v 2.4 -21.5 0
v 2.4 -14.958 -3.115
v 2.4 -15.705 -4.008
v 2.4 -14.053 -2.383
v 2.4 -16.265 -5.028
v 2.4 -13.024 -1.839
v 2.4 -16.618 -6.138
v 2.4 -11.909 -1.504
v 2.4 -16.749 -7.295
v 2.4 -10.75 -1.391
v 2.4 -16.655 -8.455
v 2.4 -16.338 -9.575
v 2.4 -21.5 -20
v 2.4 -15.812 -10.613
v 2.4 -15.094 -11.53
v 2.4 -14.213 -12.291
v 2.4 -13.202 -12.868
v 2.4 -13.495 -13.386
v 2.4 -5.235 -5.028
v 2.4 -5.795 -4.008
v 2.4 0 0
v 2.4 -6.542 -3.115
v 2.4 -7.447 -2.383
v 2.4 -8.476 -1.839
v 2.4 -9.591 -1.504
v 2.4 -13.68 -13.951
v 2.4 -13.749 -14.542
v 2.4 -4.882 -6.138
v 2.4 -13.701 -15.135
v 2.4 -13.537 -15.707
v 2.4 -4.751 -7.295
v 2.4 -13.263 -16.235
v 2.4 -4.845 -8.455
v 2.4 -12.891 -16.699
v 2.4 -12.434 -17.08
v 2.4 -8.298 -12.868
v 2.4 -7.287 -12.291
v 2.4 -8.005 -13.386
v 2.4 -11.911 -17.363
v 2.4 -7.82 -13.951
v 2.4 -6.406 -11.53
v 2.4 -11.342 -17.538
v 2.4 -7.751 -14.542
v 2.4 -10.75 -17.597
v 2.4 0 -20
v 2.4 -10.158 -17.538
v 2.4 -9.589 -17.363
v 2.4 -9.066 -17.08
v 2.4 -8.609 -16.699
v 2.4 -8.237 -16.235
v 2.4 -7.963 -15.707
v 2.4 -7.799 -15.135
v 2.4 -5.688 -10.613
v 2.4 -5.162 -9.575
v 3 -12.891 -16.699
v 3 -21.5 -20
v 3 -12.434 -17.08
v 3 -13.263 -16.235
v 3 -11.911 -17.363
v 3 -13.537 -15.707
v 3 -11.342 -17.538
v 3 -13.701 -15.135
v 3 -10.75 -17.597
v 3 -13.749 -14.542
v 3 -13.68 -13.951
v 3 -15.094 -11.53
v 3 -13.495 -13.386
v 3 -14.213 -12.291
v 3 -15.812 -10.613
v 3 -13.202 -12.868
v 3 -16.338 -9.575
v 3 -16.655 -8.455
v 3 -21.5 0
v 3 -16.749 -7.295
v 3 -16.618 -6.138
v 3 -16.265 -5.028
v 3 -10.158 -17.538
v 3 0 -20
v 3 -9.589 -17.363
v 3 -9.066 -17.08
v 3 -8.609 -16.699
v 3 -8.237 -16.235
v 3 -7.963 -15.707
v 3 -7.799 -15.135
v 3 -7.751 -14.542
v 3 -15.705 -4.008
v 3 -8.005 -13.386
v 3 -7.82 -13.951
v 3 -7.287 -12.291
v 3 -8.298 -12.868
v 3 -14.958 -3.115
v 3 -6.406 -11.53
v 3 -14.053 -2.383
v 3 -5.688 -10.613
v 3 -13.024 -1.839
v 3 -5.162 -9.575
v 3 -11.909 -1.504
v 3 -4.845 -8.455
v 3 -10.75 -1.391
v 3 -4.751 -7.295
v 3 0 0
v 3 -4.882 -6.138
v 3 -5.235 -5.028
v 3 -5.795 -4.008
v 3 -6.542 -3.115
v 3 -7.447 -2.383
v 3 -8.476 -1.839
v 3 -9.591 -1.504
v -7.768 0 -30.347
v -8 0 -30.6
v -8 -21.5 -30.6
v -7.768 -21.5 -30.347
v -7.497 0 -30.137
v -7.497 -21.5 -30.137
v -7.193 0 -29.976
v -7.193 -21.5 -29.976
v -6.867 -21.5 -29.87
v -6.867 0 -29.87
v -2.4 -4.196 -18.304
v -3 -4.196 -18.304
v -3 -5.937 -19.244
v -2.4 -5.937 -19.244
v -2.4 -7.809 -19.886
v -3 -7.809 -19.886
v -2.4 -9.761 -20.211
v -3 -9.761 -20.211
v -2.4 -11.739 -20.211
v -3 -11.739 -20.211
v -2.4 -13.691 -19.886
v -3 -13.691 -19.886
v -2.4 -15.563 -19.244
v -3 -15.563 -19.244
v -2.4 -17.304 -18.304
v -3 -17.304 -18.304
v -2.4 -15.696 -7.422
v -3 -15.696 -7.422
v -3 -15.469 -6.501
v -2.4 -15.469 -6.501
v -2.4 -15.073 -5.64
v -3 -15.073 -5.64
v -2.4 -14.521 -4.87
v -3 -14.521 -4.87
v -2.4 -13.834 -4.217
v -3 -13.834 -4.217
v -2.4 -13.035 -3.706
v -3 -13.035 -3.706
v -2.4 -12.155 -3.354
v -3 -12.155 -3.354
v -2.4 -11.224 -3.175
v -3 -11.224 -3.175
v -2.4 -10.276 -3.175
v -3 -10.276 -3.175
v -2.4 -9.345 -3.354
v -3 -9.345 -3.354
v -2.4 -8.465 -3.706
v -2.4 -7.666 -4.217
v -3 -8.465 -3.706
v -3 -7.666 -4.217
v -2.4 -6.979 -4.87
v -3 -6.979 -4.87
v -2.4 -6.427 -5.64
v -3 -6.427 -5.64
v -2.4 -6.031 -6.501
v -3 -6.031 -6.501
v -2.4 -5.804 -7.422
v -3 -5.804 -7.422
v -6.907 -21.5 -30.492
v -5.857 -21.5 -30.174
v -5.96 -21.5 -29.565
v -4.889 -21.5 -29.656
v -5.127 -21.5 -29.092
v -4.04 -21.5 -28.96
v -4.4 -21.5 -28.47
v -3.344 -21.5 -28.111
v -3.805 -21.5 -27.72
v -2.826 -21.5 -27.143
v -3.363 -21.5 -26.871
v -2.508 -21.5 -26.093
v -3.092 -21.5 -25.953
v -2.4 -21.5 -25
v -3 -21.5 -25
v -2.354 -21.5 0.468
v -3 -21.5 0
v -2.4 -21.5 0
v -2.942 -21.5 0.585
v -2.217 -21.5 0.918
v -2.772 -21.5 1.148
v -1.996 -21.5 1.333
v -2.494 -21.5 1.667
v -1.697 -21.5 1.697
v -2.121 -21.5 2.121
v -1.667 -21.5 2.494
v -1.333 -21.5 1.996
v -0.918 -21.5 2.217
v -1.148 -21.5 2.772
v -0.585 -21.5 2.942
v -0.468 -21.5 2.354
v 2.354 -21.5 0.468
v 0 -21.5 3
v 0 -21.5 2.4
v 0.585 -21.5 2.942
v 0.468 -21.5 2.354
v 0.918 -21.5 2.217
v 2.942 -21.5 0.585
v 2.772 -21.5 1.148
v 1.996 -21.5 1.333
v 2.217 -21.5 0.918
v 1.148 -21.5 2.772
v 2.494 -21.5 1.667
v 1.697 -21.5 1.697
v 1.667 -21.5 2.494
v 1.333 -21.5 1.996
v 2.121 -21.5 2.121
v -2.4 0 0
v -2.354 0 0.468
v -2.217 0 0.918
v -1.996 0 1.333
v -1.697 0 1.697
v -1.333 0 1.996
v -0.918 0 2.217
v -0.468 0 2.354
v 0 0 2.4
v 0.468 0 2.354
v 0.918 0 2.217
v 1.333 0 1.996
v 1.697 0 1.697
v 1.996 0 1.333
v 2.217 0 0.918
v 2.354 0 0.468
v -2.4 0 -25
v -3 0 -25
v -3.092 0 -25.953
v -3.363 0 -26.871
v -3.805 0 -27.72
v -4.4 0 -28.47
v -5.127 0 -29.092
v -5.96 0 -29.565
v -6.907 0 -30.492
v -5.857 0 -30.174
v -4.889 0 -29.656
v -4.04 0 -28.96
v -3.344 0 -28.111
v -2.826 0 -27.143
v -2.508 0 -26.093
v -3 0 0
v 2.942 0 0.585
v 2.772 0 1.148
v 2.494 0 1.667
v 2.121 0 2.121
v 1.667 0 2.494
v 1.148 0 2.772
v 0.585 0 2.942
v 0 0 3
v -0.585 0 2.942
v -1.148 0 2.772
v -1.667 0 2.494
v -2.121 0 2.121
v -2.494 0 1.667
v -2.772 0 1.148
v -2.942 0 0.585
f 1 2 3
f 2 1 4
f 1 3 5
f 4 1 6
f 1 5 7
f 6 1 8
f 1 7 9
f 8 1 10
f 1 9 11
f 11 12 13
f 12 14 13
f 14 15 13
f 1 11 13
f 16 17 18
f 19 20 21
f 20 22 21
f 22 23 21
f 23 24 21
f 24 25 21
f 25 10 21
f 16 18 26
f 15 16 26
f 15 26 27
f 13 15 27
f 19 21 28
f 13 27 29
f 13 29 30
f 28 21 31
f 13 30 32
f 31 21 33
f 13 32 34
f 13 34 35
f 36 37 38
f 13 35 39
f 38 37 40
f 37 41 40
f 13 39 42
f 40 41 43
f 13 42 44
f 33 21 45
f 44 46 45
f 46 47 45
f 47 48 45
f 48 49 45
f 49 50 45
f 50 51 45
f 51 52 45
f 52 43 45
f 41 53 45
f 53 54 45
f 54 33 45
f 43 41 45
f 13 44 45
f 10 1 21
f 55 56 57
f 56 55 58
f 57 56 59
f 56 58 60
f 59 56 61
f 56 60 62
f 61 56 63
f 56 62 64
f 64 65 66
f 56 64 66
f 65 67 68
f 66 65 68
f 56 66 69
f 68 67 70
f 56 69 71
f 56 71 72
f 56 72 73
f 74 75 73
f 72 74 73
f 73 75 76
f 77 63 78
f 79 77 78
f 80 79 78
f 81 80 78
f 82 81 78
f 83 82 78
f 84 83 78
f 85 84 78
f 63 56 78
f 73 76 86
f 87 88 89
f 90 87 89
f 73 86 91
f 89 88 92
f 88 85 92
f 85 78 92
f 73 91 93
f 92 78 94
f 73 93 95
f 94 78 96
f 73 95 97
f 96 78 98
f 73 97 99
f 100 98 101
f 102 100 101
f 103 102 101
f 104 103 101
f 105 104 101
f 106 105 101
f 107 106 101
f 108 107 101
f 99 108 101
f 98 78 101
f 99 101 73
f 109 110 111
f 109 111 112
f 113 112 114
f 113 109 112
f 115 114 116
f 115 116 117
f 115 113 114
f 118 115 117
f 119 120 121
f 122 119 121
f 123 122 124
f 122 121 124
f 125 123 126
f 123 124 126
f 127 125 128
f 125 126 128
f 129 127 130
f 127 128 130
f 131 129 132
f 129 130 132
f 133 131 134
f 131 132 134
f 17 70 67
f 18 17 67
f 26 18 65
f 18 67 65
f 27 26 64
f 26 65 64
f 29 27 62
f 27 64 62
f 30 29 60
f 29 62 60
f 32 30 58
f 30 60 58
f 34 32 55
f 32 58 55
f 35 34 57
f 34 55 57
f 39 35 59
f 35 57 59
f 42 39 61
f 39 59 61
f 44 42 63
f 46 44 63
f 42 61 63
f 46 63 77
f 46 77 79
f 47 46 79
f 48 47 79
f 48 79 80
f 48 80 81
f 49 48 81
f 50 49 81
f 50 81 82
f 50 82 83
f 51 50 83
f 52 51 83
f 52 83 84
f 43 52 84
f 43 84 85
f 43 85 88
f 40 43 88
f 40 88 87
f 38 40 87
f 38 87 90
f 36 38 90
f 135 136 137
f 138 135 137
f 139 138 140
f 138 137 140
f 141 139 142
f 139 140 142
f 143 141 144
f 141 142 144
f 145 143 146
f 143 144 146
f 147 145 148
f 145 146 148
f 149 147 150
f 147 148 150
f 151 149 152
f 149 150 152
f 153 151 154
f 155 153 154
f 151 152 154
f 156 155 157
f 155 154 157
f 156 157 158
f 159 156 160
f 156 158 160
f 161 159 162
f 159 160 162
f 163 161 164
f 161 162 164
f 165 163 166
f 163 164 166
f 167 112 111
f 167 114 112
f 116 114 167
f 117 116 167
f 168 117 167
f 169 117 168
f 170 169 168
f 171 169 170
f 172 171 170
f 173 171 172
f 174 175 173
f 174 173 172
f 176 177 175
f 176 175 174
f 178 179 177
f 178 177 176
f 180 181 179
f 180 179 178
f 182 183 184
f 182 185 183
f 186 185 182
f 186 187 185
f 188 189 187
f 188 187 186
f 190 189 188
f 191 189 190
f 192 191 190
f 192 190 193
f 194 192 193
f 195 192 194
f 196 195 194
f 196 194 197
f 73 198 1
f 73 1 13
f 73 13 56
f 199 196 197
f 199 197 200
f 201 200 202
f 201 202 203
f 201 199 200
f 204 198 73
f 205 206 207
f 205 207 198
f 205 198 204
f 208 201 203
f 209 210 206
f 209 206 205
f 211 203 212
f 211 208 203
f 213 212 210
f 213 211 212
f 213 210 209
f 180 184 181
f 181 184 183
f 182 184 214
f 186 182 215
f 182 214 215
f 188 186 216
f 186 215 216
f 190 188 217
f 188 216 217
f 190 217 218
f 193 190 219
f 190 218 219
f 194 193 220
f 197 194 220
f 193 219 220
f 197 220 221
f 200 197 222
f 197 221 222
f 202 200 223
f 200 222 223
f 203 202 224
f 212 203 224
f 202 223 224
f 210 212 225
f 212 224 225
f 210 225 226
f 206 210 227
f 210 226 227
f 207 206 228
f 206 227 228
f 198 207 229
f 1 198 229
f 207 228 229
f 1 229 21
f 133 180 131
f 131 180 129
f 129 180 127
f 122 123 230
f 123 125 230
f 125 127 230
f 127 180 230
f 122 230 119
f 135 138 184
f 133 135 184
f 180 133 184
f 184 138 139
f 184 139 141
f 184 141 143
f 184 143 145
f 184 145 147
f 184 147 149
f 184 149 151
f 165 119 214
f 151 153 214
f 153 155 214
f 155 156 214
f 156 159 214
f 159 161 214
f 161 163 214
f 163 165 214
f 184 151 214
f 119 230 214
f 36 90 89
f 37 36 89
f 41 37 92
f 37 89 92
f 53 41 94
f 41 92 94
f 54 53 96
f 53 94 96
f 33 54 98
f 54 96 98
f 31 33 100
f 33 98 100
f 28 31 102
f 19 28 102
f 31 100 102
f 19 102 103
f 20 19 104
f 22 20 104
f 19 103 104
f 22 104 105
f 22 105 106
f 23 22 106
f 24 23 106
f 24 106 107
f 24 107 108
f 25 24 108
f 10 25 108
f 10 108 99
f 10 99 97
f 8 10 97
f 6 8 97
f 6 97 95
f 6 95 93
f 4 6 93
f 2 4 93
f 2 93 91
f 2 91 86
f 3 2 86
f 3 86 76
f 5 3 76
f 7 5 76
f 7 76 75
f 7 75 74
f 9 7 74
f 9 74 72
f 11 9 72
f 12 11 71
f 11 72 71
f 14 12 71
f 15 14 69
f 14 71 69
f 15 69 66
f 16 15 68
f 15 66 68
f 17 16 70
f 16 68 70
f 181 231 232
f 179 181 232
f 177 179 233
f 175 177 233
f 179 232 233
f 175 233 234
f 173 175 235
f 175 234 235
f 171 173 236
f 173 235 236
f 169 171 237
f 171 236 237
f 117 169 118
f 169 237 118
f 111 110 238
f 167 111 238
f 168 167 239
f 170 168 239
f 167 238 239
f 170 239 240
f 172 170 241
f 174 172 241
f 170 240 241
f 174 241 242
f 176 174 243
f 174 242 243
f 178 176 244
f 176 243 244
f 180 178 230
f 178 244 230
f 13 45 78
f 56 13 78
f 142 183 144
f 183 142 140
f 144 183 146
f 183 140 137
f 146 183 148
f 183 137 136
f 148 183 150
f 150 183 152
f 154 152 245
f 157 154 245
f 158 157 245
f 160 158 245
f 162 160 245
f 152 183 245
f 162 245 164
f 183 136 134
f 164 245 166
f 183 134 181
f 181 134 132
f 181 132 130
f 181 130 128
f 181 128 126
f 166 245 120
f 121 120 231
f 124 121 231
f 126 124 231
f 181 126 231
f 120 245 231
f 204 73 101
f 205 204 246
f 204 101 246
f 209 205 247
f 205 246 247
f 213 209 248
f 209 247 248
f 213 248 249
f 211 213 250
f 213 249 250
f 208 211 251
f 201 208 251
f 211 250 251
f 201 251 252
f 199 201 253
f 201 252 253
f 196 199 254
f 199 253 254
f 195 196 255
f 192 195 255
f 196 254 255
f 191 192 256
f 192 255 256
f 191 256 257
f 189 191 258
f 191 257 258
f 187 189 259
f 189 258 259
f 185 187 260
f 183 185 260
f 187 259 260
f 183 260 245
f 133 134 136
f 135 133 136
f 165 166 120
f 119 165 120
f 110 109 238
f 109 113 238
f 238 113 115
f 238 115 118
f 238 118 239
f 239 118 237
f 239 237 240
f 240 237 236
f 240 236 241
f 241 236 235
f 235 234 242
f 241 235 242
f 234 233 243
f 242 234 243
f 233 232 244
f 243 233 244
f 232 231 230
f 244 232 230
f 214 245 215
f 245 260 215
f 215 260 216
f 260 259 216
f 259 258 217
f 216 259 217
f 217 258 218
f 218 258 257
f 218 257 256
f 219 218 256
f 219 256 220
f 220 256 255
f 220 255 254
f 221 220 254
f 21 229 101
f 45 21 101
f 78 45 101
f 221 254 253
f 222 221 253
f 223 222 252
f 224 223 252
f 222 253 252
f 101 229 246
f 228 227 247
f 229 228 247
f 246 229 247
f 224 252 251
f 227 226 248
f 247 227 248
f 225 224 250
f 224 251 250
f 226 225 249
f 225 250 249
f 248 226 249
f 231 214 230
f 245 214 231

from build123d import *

# Parameters (mm, degrees)
F1_DEPTH    = 21.5
F3_DEPTH    = 1
F5_DEPTH    = 1
F6_T1_DEPTH = 27.2031140795


# Not quite as in the source:
# - a fillet or chamfer that OpenCascade refuses, or shapes differently, is made with other operations: its cross-section is extruded or revolved along the edge and cut away or added


with BuildPart() as f1:
    # F0 (on Front) → F1 (new body)
    with BuildSketch(Plane.XZ):
        with BuildLine():
            Line((-3, 0), (-3, -25))
            ThreePointArc((-3, -25), (-4.4644660941, -28.5355339059), (-8, -30))
            Line((-8, -30), (-8, -30.6))
            ThreePointArc((-8, -30.6), (-4.0402020254, -28.9597979746), (-2.4, -25))
            Line((-2.4, -25), (-2.4, 0))
            ThreePointArc((-2.4, 0), (0, 2.4), (2.4, 0))
            Line((2.4, 0), (2.4, -20))
            Line((2.4, -20), (3, -20))
            Line((3, -20), (3, 0))
            ThreePointArc((3, 0), (0, 3), (-3, 0))
        make_face()
    extrude(amount=F1_DEPTH)

    # F2 (on face) → F3 (cut)
    with BuildSketch(Plane(origin=(-3, 0, 0), x_dir=(0, -1, 0), z_dir=(-1, 0, 0))):
        with BuildLine():
            Line((5.8037092493, -7.4218333804), (4.195739785, -18.3036730319))
            ThreePointArc((4.195739785, -18.3036730319), (10.75, -20.2517243137), (17.304260215, -18.3036730319))
            Line((17.304260215, -18.3036730319), (15.6962907507, -7.4218333804))
            ThreePointArc((15.6962907507, -7.4218333804), (10.75, -3.1527285914), (5.8037092493, -7.4218333804))
        make_face()
    extrude(amount=-F3_DEPTH, mode=Mode.SUBTRACT)

    # F4 (on face) → F5 (cut)
    with BuildSketch(Plane.YZ.offset(3)):
        with BuildLine():
            ThreePointArc((-13.2016747035, -12.8677467976), (-10.75, -17.5967034623), (-8.2983252965, -12.8677467976))
            ThreePointArc((-8.2983252965, -12.8677467976), (-10.75, -1.3914988898), (-13.2016747035, -12.8677467976))
        make_face()
    extrude(amount=-F5_DEPTH, mode=Mode.SUBTRACT)

    # F6: fillet of radius 2 on 1 edges, made by hand

    # F6_s2 → F6_t1 (cut)
    with BuildSketch(Plane.XZ.offset(-2.8515570398)):
        with BuildLine():
            ThreePointArc((-8, -30.6), (-7.4967757486, -30.136601148), (-6.8668213437, -29.8698979592))
            ThreePointArc((-6.8668213437, -29.8698979592), (-7.429688592, -29.9673680051), (-8, -30))
            Line((-8, -30), (-8, -30.6))
        make_face()
    extrude(amount=F6_T1_DEPTH, mode=Mode.SUBTRACT)


solid = f1.part
